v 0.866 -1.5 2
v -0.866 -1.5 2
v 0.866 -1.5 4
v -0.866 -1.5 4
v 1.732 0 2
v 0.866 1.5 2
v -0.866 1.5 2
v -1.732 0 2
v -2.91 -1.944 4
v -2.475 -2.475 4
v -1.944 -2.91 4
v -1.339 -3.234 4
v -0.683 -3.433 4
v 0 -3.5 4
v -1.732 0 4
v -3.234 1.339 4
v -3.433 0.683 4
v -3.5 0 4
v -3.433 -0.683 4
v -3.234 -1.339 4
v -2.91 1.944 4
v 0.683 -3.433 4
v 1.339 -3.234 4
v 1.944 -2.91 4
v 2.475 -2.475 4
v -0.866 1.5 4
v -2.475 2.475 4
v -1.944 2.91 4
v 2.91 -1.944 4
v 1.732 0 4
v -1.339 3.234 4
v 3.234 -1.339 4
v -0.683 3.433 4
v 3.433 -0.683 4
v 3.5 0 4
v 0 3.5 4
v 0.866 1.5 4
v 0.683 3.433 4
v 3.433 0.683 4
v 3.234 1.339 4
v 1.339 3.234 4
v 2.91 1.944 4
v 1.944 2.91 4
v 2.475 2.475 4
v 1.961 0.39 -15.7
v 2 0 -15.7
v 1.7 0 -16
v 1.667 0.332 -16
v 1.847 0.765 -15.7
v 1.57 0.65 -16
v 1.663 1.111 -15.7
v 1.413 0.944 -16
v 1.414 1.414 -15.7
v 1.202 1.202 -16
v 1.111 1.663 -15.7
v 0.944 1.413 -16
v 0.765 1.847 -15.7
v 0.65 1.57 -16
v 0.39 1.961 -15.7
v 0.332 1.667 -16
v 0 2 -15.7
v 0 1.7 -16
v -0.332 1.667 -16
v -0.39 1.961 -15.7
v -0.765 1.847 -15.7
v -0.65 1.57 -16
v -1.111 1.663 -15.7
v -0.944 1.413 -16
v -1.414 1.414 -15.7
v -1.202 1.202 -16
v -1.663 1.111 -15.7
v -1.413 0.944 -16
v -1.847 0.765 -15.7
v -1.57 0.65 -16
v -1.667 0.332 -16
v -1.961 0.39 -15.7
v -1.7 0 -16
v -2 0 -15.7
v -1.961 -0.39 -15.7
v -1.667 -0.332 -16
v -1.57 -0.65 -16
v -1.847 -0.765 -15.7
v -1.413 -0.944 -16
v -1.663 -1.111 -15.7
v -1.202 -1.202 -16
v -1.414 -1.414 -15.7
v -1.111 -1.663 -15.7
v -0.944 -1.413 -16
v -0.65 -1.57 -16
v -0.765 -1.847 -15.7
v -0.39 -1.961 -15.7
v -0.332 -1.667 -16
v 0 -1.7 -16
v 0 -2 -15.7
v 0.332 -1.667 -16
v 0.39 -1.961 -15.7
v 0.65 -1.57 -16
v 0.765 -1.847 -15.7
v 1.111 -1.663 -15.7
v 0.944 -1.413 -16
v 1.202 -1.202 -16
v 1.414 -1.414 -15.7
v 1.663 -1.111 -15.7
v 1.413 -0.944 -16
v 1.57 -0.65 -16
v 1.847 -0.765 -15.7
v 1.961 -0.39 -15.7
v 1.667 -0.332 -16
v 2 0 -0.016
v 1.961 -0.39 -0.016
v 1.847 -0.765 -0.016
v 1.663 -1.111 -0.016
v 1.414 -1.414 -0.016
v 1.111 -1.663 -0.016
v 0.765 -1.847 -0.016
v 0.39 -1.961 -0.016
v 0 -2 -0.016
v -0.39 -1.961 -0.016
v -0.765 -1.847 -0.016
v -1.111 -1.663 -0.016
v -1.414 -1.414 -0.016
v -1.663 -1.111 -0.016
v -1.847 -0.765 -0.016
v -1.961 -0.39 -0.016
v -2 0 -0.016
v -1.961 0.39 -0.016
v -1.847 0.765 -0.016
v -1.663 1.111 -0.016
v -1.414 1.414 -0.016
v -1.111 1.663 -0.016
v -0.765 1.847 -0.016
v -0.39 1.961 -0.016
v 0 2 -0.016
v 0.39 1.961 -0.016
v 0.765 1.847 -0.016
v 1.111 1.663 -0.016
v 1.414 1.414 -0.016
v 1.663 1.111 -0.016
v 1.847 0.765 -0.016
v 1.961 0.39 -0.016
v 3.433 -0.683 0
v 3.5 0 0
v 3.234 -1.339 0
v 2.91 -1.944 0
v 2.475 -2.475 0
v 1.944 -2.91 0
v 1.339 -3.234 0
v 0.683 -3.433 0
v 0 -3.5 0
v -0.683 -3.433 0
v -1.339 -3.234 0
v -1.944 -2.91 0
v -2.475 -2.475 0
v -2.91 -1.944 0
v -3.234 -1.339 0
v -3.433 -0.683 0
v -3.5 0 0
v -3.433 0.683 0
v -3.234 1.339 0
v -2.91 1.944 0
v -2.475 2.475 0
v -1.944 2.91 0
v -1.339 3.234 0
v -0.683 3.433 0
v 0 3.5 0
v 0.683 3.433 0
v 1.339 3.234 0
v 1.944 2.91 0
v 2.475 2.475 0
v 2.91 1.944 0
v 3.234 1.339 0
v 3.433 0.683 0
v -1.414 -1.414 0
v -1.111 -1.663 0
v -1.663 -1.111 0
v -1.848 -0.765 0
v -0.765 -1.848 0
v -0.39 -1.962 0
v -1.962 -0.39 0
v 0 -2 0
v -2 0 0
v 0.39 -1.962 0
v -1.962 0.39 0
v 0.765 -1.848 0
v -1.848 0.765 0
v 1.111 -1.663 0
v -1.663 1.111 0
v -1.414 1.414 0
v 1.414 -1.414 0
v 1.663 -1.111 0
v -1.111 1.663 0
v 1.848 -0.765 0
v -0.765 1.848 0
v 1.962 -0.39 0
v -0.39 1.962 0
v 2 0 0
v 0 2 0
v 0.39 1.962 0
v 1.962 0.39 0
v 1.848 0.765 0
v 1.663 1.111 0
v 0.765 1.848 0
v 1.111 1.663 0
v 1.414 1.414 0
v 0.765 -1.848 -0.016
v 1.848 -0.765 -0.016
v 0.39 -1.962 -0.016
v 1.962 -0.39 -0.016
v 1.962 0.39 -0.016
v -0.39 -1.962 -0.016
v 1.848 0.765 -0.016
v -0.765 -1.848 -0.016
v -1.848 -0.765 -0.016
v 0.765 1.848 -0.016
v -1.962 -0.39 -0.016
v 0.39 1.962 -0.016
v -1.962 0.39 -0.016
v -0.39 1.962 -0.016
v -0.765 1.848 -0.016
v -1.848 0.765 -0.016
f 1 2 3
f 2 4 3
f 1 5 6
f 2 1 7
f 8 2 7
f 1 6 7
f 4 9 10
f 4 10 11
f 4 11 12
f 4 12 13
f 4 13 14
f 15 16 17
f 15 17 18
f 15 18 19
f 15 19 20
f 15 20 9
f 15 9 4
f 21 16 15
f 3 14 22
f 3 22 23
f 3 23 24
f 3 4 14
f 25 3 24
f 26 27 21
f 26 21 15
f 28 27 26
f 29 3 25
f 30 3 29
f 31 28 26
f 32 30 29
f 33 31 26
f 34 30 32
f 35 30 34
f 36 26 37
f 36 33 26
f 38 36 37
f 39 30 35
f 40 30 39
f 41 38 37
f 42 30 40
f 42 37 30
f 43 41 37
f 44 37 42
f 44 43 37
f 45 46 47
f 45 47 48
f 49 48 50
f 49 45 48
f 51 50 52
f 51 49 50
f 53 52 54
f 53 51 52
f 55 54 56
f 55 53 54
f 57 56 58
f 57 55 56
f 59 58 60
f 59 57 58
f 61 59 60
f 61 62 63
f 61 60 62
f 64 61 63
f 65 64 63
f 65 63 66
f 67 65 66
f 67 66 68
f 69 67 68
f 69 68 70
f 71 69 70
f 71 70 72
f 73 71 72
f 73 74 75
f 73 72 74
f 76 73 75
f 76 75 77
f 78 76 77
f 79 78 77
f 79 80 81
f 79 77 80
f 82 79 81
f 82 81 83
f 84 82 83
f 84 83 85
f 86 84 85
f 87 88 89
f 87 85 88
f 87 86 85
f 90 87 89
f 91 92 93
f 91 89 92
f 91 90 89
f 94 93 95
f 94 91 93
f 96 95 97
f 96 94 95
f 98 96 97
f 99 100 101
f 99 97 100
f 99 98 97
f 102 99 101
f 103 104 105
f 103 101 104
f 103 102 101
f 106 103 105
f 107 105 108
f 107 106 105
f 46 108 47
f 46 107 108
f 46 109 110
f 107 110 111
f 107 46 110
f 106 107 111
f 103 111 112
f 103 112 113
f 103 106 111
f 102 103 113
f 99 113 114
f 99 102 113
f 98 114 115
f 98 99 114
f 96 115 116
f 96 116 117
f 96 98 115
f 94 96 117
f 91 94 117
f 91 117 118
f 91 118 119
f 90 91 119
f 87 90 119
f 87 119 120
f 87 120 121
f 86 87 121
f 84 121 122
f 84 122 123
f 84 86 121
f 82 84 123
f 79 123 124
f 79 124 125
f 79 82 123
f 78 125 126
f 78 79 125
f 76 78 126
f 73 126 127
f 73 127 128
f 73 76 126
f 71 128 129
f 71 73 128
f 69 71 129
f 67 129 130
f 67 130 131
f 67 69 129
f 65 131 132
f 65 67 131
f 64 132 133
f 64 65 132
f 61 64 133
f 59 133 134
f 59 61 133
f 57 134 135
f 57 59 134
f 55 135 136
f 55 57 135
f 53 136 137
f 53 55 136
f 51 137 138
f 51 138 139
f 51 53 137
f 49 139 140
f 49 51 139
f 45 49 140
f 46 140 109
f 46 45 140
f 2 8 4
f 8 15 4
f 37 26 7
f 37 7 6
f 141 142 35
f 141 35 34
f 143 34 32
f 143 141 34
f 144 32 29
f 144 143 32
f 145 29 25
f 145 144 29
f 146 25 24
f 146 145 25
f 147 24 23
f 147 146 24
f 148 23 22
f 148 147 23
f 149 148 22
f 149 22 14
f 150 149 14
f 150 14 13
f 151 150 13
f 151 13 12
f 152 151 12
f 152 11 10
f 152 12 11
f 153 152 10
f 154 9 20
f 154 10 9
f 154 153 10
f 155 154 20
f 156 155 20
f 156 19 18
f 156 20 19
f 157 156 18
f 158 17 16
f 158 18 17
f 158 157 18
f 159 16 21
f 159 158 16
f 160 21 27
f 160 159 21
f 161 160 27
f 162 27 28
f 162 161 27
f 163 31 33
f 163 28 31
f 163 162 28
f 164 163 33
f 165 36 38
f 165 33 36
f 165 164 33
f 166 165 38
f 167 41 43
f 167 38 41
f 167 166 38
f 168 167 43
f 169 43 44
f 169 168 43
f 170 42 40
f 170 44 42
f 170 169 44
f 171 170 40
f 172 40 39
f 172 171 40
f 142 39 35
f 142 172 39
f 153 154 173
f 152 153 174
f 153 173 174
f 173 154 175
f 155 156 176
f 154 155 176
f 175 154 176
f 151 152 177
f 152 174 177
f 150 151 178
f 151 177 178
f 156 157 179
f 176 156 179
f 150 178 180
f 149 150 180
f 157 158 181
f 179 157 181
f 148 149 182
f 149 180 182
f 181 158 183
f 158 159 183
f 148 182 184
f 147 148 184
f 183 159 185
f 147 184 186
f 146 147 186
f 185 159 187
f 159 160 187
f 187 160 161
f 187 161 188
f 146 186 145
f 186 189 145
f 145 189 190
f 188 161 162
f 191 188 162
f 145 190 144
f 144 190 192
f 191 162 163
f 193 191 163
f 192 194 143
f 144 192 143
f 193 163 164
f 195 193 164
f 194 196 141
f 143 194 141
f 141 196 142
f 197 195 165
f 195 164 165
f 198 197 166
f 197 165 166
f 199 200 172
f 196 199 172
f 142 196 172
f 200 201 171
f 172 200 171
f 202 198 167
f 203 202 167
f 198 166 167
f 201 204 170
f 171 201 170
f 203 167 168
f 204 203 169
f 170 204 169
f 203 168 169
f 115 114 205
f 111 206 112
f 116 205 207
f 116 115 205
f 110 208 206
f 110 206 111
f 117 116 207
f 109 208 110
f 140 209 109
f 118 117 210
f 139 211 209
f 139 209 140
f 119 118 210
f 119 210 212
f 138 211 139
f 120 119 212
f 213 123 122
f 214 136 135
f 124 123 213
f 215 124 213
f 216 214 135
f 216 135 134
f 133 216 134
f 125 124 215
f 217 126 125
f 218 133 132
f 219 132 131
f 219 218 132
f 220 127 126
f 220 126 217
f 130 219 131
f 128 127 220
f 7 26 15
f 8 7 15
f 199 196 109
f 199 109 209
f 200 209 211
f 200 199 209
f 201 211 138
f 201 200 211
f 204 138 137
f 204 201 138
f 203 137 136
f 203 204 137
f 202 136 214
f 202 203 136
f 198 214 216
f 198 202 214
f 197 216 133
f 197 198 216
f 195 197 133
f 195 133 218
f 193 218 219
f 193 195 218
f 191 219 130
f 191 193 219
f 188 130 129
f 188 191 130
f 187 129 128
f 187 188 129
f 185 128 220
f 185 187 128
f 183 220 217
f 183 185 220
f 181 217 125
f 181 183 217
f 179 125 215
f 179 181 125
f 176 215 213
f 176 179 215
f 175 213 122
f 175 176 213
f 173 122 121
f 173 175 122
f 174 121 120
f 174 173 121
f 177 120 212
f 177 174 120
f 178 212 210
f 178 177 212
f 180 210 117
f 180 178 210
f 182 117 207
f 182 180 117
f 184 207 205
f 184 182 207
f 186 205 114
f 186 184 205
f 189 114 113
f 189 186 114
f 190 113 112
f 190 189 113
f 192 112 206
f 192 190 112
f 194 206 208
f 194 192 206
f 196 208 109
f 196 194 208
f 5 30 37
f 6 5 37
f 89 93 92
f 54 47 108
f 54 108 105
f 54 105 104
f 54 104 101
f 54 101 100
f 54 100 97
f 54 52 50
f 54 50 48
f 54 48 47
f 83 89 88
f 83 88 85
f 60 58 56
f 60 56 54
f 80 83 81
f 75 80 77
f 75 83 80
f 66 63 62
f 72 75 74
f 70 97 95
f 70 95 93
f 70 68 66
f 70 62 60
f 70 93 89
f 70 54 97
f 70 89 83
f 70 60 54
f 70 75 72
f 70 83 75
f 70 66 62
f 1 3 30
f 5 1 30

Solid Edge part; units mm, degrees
sketch "Sketch1" plane through (0, 0, 0) normal (0, 0, 1) x (1, 0, 0)
  circle A0 centre (0, 0) radius 3.5
  dimension "D1" = 7
extrude "Protrusion1" add sketch "Sketch1" along normal blind 4
sketch "Sketch2" plane through (0, 0, 0) normal (0, 0, -1) x (1, 0, 0)
  circle A0 centre (0, 0) radius 2
extrude "Protrusion2" add sketch "Sketch2" along normal blind 16
sketch "Sketch3" plane through (0, 0, -16) normal (0, 0, -1) x (1, 0, 0)
  circle A0 centre (0, 0) radius 1.9997
extrude "Cutout1" cut sketch "Sketch3" against normal blind 15.984 flip side to cut
chamfer "Chamfer_1" distance 0.3 angle 45 1 edges at (-1.9997, 0, -16)
sketch "Sketch4" plane through (0, 0, 4) normal (0, 0, 1) x (1, 0, 0)
  line L0 (-0.866, 1.5) -> (0.866, 1.5)
  line L1 (1.7321, 0) -> (0.866, 1.5)
  line L2 (0.866, -1.5) -> (1.7321, 0)
  line L3 (-0.866, -1.5) -> (0.866, -1.5)
  line L4 (-1.7321, 0) -> (-0.866, -1.5)
  line L5 (-0.866, 1.5) -> (-1.7321, 0)
  dimension "D1" = 3
extrude "Cutout2" cut sketch "Sketch4" against normal blind 2
properties part number "24104709" material "Steel"
